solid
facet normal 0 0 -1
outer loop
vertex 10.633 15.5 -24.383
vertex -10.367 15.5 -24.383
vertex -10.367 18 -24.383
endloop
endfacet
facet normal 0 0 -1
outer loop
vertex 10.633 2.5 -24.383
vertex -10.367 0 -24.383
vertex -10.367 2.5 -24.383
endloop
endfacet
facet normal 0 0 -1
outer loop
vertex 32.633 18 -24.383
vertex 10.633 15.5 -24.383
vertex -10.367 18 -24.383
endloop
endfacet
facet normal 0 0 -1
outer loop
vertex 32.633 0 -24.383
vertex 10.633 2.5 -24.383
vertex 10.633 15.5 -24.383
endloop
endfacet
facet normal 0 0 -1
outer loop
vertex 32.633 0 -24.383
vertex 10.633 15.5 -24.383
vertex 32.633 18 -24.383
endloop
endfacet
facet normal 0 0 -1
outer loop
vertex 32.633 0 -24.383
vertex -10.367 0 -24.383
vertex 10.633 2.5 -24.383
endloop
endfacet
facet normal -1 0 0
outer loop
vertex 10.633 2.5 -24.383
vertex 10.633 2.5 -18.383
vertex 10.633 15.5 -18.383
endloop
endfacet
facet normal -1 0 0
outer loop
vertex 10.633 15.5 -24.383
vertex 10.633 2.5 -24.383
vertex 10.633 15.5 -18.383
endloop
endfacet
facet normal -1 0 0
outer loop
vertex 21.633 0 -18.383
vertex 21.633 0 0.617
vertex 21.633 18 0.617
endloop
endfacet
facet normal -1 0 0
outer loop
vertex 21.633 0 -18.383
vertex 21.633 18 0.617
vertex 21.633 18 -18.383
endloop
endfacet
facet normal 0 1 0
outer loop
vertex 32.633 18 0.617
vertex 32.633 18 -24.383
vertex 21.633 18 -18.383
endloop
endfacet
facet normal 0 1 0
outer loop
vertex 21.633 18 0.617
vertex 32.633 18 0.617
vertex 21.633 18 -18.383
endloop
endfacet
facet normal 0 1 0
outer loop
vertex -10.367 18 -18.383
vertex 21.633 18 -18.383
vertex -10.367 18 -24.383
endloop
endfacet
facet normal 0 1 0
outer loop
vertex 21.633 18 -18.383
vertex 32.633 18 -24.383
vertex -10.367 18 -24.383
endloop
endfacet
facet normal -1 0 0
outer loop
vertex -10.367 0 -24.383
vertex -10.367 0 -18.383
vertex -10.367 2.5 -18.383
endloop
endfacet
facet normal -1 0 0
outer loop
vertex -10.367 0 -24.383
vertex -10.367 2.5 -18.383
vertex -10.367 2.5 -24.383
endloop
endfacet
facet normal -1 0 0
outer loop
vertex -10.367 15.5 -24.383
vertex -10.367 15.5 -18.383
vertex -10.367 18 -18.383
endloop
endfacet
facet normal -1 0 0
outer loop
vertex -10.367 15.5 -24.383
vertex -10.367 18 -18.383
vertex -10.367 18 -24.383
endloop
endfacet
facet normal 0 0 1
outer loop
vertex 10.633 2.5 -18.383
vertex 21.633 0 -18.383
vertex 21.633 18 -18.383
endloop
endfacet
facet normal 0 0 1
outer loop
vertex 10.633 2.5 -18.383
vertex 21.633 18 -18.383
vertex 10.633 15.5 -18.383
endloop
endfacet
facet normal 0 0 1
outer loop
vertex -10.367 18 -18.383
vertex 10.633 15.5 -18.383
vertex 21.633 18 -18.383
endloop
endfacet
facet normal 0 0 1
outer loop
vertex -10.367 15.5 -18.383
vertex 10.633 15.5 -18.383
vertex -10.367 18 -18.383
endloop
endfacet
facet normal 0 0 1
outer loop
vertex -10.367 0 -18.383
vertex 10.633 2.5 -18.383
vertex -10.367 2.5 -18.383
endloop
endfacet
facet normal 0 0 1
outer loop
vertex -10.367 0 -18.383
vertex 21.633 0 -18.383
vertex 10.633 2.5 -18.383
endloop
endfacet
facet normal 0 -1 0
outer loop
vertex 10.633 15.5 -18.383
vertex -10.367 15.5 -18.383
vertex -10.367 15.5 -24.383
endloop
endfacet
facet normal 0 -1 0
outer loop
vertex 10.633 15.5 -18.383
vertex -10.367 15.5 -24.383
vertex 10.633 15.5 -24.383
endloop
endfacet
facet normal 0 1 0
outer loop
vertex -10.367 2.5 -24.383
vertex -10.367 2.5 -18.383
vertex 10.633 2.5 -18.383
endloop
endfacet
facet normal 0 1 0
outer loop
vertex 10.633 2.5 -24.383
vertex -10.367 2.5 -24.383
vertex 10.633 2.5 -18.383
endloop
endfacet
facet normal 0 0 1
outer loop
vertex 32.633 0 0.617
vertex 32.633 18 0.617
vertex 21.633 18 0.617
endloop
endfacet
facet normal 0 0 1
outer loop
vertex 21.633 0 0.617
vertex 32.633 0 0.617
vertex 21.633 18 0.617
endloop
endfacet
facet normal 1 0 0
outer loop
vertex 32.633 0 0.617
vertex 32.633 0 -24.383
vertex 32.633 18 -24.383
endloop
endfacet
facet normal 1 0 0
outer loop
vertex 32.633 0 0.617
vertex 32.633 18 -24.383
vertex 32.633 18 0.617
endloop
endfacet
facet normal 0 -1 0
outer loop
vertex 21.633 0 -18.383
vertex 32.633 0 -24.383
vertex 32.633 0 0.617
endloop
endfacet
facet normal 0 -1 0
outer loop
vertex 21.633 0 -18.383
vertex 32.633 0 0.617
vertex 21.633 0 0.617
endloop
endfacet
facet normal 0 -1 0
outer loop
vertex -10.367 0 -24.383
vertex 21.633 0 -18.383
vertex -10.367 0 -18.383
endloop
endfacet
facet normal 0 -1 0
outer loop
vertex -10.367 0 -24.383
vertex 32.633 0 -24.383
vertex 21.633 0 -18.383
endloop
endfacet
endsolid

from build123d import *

# Parameters (mm, degrees)
BOSS_EXTRUDE1_DEPTH = 18
SKETCH2_W           = 42
SKETCH2_H           = 13
CUT_EXTRUDE1_DEPTH  = 42.832217781


with BuildPart() as part:
    # Sketch1 → Boss-Extrude1 (new body)
    with BuildSketch(Plane(origin=(0, 0, 0), x_dir=(1, 0, 0), z_dir=(0, 1, 0))):
        Polygon((-10.366666667, 24.383333333), (32.633333333, 24.383333333), (32.633333333, -0.616666667), (21.633333333, -0.616666667), (21.633333333, 18.383333333), (-10.366666667, 18.383333333), align=None)
    extrude(amount=BOSS_EXTRUDE1_DEPTH)

    # Sketch2 → Cut-Extrude1 (cut, through all)
    with BuildSketch(Plane.XY.offset(-18.383333333)):
        with Locations((-10.366666667, 9)):
            Rectangle(SKETCH2_W, SKETCH2_H)
    extrude(amount=-CUT_EXTRUDE1_DEPTH, mode=Mode.SUBTRACT)


solid = part.part
